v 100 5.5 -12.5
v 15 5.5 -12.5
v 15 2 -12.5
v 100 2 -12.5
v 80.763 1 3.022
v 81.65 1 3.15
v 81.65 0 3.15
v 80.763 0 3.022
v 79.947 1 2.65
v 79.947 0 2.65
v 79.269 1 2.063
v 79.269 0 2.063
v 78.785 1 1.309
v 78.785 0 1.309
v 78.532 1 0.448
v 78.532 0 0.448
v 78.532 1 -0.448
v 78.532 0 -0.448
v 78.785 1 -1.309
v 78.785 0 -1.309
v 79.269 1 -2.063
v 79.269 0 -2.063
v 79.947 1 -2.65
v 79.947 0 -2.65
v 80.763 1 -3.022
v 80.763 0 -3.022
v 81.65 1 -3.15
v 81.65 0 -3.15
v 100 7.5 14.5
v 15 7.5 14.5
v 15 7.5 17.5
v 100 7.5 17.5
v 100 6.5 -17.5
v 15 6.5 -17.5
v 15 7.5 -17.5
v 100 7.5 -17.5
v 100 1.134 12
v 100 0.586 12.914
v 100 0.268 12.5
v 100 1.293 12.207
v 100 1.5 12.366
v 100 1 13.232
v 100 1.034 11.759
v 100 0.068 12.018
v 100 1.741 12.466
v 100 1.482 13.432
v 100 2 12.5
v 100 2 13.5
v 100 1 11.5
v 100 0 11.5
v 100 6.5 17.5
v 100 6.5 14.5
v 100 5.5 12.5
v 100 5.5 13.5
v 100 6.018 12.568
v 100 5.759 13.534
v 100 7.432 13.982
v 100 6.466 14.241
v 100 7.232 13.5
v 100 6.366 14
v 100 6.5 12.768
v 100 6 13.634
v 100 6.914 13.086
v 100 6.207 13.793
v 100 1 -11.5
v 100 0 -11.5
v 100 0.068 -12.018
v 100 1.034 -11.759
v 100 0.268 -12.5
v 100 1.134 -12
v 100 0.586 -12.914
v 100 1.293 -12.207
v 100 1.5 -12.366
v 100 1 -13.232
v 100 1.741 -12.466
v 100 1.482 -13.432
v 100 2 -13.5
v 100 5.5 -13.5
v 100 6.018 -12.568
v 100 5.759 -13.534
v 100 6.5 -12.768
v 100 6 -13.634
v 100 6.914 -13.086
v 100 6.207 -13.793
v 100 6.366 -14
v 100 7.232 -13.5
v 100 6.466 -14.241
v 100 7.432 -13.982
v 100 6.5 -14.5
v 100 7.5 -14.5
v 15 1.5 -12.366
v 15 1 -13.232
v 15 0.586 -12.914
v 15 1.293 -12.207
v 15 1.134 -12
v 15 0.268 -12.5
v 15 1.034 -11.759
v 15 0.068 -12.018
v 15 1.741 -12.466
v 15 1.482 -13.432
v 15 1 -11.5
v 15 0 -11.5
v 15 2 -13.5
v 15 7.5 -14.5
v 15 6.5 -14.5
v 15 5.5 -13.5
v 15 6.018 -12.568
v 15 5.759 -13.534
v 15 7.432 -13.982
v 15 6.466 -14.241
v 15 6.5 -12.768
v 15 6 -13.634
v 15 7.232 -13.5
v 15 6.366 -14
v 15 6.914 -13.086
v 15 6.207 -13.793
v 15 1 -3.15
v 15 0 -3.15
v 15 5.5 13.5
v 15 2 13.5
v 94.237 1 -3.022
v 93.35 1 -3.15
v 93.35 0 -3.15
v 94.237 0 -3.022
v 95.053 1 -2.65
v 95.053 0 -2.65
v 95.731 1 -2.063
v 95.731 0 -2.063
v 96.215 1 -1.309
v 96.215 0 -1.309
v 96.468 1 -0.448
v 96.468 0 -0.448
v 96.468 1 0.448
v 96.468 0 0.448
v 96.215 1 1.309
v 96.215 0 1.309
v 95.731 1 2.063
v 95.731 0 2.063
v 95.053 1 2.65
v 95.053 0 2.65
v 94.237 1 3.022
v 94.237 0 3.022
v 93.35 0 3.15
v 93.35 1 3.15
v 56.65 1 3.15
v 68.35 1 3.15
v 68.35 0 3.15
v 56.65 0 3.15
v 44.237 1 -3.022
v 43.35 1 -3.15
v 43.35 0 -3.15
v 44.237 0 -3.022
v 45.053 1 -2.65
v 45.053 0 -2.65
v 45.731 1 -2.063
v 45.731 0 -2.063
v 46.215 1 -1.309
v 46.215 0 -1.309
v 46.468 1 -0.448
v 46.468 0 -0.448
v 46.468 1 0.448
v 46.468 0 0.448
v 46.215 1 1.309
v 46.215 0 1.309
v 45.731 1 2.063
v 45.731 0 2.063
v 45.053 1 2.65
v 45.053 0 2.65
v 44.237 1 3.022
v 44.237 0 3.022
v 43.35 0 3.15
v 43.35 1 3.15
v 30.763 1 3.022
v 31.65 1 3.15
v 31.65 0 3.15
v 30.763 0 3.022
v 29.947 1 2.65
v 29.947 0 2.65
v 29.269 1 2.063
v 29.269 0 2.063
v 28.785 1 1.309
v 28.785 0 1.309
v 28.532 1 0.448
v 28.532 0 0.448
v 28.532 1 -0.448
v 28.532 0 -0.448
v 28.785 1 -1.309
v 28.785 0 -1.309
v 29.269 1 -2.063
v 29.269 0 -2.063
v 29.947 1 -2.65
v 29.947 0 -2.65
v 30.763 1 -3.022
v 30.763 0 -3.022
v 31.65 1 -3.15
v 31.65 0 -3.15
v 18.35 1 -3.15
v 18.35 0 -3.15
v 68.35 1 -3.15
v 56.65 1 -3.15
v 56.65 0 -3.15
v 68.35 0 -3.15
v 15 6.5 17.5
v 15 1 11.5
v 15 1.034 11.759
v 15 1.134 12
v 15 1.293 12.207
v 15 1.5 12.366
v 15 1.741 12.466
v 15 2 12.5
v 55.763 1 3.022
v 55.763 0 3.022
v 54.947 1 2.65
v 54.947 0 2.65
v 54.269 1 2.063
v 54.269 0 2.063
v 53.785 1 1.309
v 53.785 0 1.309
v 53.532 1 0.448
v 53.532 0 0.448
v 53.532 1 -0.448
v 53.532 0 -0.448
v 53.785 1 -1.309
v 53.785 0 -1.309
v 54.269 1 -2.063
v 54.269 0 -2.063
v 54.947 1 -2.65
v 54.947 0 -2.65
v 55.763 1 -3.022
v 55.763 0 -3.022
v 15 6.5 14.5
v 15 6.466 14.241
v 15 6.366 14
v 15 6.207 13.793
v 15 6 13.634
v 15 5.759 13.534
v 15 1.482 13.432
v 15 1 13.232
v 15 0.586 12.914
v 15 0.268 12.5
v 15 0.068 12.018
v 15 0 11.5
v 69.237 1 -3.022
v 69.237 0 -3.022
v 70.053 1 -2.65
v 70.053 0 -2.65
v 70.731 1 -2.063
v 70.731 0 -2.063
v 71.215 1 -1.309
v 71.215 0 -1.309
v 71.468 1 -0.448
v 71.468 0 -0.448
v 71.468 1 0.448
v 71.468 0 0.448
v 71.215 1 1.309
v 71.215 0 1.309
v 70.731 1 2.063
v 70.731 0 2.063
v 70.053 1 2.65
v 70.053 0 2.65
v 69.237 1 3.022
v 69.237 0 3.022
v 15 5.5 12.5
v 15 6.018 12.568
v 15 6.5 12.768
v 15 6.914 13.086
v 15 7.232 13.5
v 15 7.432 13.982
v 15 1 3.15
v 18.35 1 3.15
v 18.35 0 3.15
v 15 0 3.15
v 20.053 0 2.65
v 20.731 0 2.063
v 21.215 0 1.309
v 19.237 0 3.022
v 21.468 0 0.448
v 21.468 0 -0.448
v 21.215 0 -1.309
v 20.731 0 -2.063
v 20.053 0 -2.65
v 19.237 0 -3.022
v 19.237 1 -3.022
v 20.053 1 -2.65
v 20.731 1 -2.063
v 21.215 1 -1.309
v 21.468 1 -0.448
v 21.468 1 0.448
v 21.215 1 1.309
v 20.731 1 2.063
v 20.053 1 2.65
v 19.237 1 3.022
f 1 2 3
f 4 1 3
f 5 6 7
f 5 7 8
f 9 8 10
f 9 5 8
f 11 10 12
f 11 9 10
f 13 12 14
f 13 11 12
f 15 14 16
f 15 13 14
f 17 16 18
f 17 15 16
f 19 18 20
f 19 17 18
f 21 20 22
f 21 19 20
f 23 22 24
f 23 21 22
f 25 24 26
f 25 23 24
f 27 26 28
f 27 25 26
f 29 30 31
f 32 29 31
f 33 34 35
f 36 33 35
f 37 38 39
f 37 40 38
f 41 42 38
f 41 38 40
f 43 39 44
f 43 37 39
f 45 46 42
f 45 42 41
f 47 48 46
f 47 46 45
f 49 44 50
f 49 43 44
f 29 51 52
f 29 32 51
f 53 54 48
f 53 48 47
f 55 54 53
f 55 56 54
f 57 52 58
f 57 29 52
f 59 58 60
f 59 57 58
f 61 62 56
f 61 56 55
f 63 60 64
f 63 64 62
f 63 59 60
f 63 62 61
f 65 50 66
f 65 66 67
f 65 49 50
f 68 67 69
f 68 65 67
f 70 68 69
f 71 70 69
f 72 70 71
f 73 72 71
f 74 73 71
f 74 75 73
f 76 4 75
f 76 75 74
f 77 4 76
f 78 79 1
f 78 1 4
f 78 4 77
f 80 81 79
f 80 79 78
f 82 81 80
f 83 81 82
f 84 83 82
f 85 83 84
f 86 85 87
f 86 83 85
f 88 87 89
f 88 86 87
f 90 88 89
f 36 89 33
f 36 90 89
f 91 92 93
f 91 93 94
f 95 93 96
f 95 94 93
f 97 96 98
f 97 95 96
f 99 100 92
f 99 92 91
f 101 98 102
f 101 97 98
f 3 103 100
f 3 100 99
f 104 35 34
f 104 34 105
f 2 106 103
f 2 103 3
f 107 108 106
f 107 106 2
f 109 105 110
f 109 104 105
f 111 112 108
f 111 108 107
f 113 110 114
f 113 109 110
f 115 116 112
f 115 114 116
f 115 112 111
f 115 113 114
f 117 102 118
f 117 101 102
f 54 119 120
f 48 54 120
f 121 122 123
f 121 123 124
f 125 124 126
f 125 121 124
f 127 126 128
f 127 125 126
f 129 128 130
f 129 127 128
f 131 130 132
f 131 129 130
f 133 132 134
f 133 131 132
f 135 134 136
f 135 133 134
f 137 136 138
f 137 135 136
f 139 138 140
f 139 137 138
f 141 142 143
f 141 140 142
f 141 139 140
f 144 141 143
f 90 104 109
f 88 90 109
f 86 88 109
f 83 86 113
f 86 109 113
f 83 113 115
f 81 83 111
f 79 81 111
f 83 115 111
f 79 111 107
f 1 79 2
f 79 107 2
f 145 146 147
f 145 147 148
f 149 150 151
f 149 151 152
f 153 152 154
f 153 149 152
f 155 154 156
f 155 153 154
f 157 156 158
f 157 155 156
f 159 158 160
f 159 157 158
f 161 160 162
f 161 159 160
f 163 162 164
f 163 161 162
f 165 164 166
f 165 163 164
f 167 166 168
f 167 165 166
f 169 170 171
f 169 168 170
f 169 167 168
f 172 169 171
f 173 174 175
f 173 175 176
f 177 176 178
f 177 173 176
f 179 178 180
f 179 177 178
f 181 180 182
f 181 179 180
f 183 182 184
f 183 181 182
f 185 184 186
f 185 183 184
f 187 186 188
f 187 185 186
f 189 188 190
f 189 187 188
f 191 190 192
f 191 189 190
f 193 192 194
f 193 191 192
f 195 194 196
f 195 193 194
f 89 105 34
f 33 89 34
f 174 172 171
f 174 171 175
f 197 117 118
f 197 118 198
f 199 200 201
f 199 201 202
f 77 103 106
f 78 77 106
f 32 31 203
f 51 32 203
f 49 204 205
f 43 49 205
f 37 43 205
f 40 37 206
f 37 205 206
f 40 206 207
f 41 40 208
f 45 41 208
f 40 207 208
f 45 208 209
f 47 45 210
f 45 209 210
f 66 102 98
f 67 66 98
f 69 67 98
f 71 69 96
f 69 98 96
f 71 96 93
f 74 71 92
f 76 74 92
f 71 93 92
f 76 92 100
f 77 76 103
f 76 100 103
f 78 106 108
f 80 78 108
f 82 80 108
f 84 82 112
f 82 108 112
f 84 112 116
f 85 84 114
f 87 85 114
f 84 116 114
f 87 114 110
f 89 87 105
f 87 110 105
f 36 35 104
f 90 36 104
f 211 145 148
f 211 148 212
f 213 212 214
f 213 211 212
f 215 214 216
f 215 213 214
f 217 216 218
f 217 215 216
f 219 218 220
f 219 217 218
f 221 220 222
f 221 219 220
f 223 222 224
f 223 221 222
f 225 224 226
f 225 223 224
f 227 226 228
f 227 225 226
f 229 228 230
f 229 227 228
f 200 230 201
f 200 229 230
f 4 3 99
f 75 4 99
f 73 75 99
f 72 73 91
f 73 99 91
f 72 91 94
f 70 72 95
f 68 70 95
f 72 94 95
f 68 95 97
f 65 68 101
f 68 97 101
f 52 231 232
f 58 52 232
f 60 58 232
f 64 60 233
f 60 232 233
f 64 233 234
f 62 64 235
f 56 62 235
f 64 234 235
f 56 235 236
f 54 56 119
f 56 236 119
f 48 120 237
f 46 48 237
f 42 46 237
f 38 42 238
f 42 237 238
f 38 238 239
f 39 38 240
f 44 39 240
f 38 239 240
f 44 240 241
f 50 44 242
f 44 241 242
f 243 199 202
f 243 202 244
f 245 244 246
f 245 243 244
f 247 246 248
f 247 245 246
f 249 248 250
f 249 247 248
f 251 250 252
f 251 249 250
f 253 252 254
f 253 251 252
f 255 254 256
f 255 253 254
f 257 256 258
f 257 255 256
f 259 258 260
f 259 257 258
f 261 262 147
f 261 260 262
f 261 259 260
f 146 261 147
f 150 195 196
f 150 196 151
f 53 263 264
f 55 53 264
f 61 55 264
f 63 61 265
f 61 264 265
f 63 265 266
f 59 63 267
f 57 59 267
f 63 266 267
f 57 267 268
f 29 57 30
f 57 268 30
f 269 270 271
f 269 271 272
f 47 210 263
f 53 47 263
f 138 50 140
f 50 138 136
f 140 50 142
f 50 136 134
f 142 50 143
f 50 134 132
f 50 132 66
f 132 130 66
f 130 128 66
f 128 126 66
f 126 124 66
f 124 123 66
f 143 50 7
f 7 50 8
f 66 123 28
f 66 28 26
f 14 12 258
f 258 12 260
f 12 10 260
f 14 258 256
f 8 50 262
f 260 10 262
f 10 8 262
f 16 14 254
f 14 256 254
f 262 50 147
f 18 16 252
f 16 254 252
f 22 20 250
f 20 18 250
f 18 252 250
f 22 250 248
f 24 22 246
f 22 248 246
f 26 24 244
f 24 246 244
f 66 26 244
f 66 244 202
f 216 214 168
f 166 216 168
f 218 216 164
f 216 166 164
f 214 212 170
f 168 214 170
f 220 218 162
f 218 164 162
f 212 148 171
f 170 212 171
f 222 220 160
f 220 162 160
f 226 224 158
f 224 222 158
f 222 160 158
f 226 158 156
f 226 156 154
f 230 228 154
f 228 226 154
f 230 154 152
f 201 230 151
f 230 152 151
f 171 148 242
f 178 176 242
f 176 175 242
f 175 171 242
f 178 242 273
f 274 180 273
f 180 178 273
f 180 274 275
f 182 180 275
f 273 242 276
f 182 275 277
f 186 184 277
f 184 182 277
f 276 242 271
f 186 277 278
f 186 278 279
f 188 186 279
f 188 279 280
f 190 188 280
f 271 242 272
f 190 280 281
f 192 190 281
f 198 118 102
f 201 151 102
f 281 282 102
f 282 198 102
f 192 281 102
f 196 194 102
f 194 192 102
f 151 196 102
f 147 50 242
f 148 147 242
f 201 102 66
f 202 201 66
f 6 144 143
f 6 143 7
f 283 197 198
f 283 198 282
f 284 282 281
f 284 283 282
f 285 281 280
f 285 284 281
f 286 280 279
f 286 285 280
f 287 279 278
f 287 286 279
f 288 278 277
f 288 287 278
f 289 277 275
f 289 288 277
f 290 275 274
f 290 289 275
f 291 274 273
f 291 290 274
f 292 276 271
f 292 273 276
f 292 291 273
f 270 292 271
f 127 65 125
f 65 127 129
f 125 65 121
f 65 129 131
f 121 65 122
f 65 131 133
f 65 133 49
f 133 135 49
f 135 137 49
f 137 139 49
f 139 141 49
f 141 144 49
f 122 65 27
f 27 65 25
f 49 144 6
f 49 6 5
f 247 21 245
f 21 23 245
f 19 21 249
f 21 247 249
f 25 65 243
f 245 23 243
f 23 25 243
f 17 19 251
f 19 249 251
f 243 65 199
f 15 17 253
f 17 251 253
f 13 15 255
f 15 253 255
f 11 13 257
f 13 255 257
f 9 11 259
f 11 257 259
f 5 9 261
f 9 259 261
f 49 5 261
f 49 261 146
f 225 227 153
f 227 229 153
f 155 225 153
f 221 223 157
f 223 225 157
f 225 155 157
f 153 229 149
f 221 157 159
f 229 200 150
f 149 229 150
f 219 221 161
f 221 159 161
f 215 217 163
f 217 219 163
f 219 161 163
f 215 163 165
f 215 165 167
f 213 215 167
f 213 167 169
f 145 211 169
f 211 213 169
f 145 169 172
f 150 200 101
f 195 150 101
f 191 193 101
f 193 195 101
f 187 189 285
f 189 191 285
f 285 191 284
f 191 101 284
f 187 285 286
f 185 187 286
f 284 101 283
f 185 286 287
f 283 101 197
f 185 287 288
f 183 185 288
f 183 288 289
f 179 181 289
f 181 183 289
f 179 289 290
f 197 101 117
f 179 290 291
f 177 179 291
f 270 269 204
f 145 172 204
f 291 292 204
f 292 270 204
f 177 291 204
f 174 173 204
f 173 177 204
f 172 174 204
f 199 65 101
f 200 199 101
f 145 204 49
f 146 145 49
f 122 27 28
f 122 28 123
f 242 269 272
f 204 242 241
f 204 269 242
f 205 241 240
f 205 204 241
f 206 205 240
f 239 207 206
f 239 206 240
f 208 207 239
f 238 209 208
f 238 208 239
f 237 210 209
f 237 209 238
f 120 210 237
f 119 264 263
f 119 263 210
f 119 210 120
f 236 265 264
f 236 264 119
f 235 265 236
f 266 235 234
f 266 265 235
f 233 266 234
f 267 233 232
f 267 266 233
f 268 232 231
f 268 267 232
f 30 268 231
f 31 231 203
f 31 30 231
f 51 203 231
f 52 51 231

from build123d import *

# Parameters (mm, degrees)
SM_BASE_FLANGE_1_DEPTH = 100
CUT_EXTRUDE_1_DEPTH    = 102.727577382
PATTERN_LINEAR_6_COUNT = 4
PATTERN_LINEAR_6_PITCH = 25
SKETCH2_W              = 120.770502754
SKETCH2_H              = 115.80541844
CUT_EXTRUDE1_DEPTH     = 15


# Sheet-metal steps are written as plain solids
with BuildPart() as part:
    # Sketch 1 → Базовая кромка1 (new body)
    with BuildSketch(Plane(origin=(0, 0, 0), x_dir=(0, 0, -1), z_dir=(1, 0, 0))):
        with BuildLine():
            Line((-17.5, 6.5), (-14.5, 6.5))
            ThreePointArc((-14.5, 6.5), (-13.792893219, 6.207106781), (-13.5, 5.5))
            Line((-13.5, 5.5), (-13.5, 2))
            ThreePointArc((-13.5, 2), (-12.914213562, 0.585786438), (-11.5, 0))
            Line((-11.5, 0), (11.5, 0))
            ThreePointArc((11.5, 0), (12.914213562, 0.585786438), (13.5, 2))
            Line((13.5, 2), (13.5, 5.5))
            ThreePointArc((13.5, 5.5), (13.792893219, 6.207106781), (14.5, 6.5))
            Line((14.5, 6.5), (17.5, 6.5))
            Line((17.5, 6.5), (17.5, 7.5))
            Line((17.5, 7.5), (14.5, 7.5))
            ThreePointArc((14.5, 7.5), (13.085786438, 6.914213562), (12.5, 5.5))
            Line((12.5, 5.5), (12.5, 2))
            ThreePointArc((12.5, 2), (12.207106781, 1.292893219), (11.5, 1))
            Line((11.5, 1), (-11.5, 1))
            ThreePointArc((-11.5, 1), (-12.207106781, 1.292893219), (-12.5, 2))
            Line((-12.5, 2), (-12.5, 5.5))
            ThreePointArc((-12.5, 5.5), (-13.085786438, 6.914213562), (-14.5, 7.5))
            Line((-14.5, 7.5), (-17.5, 7.5))
            Line((-17.5, 7.5), (-17.5, 6.5))
        make_face()
    extrude(amount=SM_BASE_FLANGE_1_DEPTH)

    # Эскиз6 → Вырез-Вытянуть1 (cut, through all)
    with BuildSketch(Plane(origin=(0, 1, 0), x_dir=(1, 0, 0), z_dir=(0, 1, 0))):
        with BuildLine():
            Line((6.65, 3.15), (18.35, 3.15))
            ThreePointArc((18.35, 3.15), (21.5, 0), (18.35, -3.15))
            Line((18.35, -3.15), (6.65, -3.15))
            ThreePointArc((6.65, -3.15), (3.5, 0), (6.65, 3.15))
        make_face()
    cut_extrude_1 = extrude(amount=-CUT_EXTRUDE_1_DEPTH, mode=Mode.SUBTRACT)

    # Линейный массив6: Вырез-Вытянуть1 ×4
    with Locations(*[(i * PATTERN_LINEAR_6_PITCH, 0, 0) for i in range(1, PATTERN_LINEAR_6_COUNT)]):
        add(cut_extrude_1, mode=Mode.SUBTRACT)

    # Sketch2 → Cut-Extrude1 (cut)
    with BuildSketch(Plane.ZY):
        with Locations((-11.279080545, 0.592045476)):
            Rectangle(SKETCH2_W, SKETCH2_H)
    extrude(amount=-CUT_EXTRUDE1_DEPTH, mode=Mode.SUBTRACT)


solid = part.part
